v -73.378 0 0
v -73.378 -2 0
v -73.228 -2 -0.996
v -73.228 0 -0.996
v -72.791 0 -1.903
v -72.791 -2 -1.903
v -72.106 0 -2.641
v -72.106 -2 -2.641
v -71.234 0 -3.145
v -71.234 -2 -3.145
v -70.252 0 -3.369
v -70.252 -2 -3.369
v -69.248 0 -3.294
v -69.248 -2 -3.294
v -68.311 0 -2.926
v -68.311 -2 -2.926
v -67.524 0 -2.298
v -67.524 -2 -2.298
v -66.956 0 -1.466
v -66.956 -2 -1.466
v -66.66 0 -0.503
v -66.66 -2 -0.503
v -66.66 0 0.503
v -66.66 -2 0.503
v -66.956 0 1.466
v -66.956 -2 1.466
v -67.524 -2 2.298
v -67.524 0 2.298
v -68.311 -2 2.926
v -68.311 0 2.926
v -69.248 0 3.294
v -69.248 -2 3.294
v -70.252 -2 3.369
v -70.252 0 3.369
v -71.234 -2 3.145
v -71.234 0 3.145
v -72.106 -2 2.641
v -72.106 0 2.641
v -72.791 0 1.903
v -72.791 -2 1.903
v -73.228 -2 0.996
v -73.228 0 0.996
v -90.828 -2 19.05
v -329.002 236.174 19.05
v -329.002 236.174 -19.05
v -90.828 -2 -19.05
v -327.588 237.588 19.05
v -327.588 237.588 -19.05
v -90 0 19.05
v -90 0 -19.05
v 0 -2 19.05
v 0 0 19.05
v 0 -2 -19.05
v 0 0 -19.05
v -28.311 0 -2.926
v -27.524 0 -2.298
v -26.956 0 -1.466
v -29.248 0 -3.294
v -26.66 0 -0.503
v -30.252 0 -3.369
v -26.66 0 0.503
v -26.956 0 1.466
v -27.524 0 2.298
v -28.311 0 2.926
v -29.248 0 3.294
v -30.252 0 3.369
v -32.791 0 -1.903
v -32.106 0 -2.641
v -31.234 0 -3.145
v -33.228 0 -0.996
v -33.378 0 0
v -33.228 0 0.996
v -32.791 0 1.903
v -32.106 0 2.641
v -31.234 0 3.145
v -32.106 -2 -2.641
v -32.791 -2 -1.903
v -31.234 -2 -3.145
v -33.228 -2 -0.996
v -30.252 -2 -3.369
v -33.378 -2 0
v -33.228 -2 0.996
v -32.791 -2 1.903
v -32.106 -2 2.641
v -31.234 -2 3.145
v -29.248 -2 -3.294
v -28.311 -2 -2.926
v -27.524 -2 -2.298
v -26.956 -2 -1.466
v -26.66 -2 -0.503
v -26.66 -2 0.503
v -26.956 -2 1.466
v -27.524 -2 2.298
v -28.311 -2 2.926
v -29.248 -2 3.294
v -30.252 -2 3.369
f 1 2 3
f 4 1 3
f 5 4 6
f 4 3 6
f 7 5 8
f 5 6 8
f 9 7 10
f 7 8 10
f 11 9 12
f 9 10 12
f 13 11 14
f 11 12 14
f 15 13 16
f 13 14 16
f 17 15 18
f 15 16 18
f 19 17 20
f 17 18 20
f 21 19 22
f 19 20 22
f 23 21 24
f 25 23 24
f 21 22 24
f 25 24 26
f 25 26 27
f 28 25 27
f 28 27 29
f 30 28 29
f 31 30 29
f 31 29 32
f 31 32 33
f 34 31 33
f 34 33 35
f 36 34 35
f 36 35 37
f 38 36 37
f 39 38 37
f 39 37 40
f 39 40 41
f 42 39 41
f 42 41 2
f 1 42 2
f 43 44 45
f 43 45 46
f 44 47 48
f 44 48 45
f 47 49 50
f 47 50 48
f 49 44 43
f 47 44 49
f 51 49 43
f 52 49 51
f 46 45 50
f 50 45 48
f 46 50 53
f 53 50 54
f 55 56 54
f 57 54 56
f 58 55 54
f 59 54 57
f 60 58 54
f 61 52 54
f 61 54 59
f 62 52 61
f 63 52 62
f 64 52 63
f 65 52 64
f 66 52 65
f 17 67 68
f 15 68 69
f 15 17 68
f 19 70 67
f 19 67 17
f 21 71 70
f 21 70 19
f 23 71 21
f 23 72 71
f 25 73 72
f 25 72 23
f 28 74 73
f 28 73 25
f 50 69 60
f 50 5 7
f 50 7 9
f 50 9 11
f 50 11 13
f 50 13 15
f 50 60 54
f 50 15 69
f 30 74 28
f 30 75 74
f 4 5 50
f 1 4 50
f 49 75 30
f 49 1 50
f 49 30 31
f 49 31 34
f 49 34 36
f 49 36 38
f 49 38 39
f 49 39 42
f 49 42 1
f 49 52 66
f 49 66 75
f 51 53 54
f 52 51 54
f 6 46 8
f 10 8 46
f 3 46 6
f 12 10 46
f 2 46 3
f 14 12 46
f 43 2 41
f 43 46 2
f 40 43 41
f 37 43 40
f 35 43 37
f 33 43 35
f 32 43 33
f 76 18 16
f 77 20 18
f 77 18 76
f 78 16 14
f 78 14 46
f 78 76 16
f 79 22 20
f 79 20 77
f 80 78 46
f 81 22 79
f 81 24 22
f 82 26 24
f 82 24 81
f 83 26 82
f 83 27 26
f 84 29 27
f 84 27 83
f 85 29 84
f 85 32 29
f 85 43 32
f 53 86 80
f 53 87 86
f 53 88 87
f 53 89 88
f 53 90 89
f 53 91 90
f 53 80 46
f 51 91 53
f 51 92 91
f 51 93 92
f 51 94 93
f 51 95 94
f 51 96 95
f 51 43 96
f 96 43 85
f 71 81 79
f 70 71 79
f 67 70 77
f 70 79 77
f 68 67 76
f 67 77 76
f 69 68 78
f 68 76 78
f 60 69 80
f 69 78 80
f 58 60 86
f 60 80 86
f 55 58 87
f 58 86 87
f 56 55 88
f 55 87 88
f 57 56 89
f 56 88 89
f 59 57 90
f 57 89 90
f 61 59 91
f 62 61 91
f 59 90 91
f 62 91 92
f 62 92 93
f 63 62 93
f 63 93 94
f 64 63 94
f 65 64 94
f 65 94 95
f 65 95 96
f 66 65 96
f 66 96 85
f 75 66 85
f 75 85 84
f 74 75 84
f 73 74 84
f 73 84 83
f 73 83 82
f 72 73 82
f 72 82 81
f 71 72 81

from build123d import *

# Parameters (mm, degrees)
SALIENTE_EXTRUIR1_DEPTH       = 19.05
TALADRO_DE_MARGEN_PARA_1_41_D = 6.7564


with BuildPart() as part:
    # Croquis1 → Saliente-Extruir1 (new, symmetric)
    with BuildSketch(Plane.XY):
        Polygon((0, 0), (-90, 0), (-327.587878479, 237.587878479), (-329.002092041, 236.173664916), (-90.828427125, -2), (0, -2), align=None)
    extrude(amount=SALIENTE_EXTRUIR1_DEPTH, both=True)

    # Taladro de margen para 1/41 (through all)
    with Locations(Plane(origin=(-70, 0, 0), x_dir=(1, 0, 0), z_dir=(0, 1, 0))):
        with Locations((0, 0), (40, 0)):
            Hole(TALADRO_DE_MARGEN_PARA_1_41_D / 2)


solid = part.part
